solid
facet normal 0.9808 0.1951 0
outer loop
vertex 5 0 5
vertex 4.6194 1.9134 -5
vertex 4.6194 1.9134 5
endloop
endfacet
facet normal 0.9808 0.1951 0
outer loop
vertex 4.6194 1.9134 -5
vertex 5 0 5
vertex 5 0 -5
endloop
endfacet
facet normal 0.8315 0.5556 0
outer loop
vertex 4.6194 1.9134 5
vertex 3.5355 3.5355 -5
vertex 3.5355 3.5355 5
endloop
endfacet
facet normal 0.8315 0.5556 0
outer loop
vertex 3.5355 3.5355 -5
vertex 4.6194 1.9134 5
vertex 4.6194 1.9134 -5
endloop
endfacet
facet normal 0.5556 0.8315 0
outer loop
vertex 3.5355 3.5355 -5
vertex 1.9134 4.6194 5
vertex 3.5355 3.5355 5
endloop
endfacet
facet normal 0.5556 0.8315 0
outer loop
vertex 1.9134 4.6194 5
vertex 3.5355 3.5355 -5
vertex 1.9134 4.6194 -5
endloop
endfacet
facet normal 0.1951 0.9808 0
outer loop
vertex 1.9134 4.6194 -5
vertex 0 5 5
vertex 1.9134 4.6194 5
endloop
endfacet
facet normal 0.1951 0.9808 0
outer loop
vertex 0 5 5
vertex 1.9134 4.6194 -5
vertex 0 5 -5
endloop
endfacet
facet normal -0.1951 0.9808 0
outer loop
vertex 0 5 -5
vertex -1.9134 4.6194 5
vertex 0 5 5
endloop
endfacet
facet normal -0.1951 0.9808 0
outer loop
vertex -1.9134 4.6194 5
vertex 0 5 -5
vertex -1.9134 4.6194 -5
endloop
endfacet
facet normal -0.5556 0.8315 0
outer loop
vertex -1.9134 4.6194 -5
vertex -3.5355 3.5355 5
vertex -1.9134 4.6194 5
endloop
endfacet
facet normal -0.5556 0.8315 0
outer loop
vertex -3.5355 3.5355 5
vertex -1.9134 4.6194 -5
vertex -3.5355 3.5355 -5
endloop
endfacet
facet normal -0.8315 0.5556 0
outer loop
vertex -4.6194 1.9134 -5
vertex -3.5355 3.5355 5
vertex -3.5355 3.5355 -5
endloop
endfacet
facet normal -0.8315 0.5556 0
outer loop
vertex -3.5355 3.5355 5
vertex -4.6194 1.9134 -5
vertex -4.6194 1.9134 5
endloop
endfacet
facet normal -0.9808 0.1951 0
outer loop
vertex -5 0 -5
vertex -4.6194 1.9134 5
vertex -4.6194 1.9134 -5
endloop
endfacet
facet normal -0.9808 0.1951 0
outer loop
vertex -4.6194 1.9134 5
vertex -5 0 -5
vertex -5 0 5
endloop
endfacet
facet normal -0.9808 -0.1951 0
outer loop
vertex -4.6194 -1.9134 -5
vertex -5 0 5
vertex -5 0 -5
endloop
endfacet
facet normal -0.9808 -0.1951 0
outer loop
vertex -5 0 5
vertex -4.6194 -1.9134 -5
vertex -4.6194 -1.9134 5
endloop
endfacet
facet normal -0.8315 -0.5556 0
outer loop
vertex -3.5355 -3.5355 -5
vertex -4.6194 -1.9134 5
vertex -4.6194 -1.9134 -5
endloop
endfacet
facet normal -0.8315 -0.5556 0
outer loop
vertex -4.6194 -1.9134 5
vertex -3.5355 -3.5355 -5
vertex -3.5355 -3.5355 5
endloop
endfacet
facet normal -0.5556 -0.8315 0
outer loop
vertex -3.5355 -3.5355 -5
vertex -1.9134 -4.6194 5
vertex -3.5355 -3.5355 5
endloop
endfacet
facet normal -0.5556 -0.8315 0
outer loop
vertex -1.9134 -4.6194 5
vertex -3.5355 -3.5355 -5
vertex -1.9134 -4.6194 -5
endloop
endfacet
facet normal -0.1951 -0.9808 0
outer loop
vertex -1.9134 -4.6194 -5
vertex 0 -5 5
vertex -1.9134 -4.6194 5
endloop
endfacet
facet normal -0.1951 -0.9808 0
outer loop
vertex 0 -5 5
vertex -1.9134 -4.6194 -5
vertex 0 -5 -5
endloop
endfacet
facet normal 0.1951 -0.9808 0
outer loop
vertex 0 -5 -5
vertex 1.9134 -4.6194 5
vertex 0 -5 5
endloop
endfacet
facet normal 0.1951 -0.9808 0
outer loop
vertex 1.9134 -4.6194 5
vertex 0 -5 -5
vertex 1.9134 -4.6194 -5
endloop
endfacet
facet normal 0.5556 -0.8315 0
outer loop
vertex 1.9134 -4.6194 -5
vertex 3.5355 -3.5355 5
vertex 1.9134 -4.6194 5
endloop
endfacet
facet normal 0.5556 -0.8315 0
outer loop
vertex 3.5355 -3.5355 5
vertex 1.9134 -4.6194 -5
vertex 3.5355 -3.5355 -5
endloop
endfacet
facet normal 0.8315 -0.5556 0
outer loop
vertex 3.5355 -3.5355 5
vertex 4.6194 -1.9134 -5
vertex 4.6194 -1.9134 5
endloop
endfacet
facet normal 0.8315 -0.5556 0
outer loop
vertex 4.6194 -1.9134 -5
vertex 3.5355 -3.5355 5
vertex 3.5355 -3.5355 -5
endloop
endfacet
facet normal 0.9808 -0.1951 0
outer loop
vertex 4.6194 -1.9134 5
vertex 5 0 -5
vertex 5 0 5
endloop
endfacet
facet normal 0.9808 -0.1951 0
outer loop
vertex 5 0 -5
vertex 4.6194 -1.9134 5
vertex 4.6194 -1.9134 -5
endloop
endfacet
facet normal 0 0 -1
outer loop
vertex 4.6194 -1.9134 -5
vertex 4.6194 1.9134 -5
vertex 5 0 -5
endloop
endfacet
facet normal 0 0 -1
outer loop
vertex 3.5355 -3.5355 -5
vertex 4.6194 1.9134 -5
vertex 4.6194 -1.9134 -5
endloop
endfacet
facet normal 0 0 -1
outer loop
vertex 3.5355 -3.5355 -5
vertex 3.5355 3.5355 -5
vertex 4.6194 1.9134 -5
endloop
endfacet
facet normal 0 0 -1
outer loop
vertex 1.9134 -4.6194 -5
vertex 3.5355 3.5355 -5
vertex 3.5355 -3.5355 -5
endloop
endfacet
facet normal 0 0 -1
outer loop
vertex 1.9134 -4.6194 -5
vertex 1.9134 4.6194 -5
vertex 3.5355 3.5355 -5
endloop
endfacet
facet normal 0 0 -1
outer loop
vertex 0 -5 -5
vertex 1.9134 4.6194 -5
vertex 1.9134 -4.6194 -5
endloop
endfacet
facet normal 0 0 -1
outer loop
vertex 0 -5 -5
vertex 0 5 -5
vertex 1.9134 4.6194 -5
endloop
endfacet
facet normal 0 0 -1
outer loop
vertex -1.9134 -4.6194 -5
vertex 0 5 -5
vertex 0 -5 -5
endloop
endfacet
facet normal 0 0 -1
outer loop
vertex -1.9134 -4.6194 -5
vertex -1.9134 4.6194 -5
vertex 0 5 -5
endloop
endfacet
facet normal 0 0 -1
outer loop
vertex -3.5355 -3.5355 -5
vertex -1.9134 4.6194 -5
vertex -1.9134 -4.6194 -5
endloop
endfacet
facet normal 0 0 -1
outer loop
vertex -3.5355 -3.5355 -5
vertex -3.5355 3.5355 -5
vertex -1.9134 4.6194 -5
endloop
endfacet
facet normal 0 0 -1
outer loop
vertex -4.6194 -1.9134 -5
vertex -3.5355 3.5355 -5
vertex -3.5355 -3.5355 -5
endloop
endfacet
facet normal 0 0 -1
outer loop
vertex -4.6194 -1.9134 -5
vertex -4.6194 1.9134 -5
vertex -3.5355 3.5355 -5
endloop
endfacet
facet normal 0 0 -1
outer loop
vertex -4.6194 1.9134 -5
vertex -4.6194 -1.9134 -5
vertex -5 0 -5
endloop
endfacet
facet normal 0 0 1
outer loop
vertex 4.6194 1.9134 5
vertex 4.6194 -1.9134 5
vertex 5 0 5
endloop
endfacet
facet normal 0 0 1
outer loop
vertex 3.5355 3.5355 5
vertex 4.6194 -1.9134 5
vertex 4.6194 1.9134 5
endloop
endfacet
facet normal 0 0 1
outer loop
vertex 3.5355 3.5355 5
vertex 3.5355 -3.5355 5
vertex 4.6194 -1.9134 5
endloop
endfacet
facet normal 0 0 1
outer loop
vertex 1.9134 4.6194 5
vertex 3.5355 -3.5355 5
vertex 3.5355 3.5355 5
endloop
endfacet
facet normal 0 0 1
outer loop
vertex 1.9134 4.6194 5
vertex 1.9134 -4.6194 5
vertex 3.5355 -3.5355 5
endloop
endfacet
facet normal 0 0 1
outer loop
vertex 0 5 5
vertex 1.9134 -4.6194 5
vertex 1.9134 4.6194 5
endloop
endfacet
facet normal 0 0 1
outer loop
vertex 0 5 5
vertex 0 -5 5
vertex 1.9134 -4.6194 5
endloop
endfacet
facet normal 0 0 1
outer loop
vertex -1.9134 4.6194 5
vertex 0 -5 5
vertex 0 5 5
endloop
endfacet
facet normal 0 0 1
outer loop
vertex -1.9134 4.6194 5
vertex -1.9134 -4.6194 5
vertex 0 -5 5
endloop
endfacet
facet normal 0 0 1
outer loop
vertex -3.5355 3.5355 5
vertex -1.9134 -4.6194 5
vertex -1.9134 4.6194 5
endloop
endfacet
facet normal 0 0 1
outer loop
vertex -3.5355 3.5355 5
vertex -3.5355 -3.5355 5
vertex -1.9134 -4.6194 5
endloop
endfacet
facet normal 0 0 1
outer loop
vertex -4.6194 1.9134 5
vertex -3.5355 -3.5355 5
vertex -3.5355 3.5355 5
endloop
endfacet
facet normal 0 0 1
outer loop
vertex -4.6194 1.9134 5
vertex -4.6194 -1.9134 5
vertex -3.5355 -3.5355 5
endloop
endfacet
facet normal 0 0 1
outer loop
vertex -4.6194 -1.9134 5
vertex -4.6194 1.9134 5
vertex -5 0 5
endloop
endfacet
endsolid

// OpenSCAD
cylinder_height=10; // [1:50]
cylinder_top=5; // [1:50]
cylinder_bottom=5; // [1:50]

cylinder(r1=cylinder_bottom,r2=cylinder_top,h=cylinder_height,center=true);
